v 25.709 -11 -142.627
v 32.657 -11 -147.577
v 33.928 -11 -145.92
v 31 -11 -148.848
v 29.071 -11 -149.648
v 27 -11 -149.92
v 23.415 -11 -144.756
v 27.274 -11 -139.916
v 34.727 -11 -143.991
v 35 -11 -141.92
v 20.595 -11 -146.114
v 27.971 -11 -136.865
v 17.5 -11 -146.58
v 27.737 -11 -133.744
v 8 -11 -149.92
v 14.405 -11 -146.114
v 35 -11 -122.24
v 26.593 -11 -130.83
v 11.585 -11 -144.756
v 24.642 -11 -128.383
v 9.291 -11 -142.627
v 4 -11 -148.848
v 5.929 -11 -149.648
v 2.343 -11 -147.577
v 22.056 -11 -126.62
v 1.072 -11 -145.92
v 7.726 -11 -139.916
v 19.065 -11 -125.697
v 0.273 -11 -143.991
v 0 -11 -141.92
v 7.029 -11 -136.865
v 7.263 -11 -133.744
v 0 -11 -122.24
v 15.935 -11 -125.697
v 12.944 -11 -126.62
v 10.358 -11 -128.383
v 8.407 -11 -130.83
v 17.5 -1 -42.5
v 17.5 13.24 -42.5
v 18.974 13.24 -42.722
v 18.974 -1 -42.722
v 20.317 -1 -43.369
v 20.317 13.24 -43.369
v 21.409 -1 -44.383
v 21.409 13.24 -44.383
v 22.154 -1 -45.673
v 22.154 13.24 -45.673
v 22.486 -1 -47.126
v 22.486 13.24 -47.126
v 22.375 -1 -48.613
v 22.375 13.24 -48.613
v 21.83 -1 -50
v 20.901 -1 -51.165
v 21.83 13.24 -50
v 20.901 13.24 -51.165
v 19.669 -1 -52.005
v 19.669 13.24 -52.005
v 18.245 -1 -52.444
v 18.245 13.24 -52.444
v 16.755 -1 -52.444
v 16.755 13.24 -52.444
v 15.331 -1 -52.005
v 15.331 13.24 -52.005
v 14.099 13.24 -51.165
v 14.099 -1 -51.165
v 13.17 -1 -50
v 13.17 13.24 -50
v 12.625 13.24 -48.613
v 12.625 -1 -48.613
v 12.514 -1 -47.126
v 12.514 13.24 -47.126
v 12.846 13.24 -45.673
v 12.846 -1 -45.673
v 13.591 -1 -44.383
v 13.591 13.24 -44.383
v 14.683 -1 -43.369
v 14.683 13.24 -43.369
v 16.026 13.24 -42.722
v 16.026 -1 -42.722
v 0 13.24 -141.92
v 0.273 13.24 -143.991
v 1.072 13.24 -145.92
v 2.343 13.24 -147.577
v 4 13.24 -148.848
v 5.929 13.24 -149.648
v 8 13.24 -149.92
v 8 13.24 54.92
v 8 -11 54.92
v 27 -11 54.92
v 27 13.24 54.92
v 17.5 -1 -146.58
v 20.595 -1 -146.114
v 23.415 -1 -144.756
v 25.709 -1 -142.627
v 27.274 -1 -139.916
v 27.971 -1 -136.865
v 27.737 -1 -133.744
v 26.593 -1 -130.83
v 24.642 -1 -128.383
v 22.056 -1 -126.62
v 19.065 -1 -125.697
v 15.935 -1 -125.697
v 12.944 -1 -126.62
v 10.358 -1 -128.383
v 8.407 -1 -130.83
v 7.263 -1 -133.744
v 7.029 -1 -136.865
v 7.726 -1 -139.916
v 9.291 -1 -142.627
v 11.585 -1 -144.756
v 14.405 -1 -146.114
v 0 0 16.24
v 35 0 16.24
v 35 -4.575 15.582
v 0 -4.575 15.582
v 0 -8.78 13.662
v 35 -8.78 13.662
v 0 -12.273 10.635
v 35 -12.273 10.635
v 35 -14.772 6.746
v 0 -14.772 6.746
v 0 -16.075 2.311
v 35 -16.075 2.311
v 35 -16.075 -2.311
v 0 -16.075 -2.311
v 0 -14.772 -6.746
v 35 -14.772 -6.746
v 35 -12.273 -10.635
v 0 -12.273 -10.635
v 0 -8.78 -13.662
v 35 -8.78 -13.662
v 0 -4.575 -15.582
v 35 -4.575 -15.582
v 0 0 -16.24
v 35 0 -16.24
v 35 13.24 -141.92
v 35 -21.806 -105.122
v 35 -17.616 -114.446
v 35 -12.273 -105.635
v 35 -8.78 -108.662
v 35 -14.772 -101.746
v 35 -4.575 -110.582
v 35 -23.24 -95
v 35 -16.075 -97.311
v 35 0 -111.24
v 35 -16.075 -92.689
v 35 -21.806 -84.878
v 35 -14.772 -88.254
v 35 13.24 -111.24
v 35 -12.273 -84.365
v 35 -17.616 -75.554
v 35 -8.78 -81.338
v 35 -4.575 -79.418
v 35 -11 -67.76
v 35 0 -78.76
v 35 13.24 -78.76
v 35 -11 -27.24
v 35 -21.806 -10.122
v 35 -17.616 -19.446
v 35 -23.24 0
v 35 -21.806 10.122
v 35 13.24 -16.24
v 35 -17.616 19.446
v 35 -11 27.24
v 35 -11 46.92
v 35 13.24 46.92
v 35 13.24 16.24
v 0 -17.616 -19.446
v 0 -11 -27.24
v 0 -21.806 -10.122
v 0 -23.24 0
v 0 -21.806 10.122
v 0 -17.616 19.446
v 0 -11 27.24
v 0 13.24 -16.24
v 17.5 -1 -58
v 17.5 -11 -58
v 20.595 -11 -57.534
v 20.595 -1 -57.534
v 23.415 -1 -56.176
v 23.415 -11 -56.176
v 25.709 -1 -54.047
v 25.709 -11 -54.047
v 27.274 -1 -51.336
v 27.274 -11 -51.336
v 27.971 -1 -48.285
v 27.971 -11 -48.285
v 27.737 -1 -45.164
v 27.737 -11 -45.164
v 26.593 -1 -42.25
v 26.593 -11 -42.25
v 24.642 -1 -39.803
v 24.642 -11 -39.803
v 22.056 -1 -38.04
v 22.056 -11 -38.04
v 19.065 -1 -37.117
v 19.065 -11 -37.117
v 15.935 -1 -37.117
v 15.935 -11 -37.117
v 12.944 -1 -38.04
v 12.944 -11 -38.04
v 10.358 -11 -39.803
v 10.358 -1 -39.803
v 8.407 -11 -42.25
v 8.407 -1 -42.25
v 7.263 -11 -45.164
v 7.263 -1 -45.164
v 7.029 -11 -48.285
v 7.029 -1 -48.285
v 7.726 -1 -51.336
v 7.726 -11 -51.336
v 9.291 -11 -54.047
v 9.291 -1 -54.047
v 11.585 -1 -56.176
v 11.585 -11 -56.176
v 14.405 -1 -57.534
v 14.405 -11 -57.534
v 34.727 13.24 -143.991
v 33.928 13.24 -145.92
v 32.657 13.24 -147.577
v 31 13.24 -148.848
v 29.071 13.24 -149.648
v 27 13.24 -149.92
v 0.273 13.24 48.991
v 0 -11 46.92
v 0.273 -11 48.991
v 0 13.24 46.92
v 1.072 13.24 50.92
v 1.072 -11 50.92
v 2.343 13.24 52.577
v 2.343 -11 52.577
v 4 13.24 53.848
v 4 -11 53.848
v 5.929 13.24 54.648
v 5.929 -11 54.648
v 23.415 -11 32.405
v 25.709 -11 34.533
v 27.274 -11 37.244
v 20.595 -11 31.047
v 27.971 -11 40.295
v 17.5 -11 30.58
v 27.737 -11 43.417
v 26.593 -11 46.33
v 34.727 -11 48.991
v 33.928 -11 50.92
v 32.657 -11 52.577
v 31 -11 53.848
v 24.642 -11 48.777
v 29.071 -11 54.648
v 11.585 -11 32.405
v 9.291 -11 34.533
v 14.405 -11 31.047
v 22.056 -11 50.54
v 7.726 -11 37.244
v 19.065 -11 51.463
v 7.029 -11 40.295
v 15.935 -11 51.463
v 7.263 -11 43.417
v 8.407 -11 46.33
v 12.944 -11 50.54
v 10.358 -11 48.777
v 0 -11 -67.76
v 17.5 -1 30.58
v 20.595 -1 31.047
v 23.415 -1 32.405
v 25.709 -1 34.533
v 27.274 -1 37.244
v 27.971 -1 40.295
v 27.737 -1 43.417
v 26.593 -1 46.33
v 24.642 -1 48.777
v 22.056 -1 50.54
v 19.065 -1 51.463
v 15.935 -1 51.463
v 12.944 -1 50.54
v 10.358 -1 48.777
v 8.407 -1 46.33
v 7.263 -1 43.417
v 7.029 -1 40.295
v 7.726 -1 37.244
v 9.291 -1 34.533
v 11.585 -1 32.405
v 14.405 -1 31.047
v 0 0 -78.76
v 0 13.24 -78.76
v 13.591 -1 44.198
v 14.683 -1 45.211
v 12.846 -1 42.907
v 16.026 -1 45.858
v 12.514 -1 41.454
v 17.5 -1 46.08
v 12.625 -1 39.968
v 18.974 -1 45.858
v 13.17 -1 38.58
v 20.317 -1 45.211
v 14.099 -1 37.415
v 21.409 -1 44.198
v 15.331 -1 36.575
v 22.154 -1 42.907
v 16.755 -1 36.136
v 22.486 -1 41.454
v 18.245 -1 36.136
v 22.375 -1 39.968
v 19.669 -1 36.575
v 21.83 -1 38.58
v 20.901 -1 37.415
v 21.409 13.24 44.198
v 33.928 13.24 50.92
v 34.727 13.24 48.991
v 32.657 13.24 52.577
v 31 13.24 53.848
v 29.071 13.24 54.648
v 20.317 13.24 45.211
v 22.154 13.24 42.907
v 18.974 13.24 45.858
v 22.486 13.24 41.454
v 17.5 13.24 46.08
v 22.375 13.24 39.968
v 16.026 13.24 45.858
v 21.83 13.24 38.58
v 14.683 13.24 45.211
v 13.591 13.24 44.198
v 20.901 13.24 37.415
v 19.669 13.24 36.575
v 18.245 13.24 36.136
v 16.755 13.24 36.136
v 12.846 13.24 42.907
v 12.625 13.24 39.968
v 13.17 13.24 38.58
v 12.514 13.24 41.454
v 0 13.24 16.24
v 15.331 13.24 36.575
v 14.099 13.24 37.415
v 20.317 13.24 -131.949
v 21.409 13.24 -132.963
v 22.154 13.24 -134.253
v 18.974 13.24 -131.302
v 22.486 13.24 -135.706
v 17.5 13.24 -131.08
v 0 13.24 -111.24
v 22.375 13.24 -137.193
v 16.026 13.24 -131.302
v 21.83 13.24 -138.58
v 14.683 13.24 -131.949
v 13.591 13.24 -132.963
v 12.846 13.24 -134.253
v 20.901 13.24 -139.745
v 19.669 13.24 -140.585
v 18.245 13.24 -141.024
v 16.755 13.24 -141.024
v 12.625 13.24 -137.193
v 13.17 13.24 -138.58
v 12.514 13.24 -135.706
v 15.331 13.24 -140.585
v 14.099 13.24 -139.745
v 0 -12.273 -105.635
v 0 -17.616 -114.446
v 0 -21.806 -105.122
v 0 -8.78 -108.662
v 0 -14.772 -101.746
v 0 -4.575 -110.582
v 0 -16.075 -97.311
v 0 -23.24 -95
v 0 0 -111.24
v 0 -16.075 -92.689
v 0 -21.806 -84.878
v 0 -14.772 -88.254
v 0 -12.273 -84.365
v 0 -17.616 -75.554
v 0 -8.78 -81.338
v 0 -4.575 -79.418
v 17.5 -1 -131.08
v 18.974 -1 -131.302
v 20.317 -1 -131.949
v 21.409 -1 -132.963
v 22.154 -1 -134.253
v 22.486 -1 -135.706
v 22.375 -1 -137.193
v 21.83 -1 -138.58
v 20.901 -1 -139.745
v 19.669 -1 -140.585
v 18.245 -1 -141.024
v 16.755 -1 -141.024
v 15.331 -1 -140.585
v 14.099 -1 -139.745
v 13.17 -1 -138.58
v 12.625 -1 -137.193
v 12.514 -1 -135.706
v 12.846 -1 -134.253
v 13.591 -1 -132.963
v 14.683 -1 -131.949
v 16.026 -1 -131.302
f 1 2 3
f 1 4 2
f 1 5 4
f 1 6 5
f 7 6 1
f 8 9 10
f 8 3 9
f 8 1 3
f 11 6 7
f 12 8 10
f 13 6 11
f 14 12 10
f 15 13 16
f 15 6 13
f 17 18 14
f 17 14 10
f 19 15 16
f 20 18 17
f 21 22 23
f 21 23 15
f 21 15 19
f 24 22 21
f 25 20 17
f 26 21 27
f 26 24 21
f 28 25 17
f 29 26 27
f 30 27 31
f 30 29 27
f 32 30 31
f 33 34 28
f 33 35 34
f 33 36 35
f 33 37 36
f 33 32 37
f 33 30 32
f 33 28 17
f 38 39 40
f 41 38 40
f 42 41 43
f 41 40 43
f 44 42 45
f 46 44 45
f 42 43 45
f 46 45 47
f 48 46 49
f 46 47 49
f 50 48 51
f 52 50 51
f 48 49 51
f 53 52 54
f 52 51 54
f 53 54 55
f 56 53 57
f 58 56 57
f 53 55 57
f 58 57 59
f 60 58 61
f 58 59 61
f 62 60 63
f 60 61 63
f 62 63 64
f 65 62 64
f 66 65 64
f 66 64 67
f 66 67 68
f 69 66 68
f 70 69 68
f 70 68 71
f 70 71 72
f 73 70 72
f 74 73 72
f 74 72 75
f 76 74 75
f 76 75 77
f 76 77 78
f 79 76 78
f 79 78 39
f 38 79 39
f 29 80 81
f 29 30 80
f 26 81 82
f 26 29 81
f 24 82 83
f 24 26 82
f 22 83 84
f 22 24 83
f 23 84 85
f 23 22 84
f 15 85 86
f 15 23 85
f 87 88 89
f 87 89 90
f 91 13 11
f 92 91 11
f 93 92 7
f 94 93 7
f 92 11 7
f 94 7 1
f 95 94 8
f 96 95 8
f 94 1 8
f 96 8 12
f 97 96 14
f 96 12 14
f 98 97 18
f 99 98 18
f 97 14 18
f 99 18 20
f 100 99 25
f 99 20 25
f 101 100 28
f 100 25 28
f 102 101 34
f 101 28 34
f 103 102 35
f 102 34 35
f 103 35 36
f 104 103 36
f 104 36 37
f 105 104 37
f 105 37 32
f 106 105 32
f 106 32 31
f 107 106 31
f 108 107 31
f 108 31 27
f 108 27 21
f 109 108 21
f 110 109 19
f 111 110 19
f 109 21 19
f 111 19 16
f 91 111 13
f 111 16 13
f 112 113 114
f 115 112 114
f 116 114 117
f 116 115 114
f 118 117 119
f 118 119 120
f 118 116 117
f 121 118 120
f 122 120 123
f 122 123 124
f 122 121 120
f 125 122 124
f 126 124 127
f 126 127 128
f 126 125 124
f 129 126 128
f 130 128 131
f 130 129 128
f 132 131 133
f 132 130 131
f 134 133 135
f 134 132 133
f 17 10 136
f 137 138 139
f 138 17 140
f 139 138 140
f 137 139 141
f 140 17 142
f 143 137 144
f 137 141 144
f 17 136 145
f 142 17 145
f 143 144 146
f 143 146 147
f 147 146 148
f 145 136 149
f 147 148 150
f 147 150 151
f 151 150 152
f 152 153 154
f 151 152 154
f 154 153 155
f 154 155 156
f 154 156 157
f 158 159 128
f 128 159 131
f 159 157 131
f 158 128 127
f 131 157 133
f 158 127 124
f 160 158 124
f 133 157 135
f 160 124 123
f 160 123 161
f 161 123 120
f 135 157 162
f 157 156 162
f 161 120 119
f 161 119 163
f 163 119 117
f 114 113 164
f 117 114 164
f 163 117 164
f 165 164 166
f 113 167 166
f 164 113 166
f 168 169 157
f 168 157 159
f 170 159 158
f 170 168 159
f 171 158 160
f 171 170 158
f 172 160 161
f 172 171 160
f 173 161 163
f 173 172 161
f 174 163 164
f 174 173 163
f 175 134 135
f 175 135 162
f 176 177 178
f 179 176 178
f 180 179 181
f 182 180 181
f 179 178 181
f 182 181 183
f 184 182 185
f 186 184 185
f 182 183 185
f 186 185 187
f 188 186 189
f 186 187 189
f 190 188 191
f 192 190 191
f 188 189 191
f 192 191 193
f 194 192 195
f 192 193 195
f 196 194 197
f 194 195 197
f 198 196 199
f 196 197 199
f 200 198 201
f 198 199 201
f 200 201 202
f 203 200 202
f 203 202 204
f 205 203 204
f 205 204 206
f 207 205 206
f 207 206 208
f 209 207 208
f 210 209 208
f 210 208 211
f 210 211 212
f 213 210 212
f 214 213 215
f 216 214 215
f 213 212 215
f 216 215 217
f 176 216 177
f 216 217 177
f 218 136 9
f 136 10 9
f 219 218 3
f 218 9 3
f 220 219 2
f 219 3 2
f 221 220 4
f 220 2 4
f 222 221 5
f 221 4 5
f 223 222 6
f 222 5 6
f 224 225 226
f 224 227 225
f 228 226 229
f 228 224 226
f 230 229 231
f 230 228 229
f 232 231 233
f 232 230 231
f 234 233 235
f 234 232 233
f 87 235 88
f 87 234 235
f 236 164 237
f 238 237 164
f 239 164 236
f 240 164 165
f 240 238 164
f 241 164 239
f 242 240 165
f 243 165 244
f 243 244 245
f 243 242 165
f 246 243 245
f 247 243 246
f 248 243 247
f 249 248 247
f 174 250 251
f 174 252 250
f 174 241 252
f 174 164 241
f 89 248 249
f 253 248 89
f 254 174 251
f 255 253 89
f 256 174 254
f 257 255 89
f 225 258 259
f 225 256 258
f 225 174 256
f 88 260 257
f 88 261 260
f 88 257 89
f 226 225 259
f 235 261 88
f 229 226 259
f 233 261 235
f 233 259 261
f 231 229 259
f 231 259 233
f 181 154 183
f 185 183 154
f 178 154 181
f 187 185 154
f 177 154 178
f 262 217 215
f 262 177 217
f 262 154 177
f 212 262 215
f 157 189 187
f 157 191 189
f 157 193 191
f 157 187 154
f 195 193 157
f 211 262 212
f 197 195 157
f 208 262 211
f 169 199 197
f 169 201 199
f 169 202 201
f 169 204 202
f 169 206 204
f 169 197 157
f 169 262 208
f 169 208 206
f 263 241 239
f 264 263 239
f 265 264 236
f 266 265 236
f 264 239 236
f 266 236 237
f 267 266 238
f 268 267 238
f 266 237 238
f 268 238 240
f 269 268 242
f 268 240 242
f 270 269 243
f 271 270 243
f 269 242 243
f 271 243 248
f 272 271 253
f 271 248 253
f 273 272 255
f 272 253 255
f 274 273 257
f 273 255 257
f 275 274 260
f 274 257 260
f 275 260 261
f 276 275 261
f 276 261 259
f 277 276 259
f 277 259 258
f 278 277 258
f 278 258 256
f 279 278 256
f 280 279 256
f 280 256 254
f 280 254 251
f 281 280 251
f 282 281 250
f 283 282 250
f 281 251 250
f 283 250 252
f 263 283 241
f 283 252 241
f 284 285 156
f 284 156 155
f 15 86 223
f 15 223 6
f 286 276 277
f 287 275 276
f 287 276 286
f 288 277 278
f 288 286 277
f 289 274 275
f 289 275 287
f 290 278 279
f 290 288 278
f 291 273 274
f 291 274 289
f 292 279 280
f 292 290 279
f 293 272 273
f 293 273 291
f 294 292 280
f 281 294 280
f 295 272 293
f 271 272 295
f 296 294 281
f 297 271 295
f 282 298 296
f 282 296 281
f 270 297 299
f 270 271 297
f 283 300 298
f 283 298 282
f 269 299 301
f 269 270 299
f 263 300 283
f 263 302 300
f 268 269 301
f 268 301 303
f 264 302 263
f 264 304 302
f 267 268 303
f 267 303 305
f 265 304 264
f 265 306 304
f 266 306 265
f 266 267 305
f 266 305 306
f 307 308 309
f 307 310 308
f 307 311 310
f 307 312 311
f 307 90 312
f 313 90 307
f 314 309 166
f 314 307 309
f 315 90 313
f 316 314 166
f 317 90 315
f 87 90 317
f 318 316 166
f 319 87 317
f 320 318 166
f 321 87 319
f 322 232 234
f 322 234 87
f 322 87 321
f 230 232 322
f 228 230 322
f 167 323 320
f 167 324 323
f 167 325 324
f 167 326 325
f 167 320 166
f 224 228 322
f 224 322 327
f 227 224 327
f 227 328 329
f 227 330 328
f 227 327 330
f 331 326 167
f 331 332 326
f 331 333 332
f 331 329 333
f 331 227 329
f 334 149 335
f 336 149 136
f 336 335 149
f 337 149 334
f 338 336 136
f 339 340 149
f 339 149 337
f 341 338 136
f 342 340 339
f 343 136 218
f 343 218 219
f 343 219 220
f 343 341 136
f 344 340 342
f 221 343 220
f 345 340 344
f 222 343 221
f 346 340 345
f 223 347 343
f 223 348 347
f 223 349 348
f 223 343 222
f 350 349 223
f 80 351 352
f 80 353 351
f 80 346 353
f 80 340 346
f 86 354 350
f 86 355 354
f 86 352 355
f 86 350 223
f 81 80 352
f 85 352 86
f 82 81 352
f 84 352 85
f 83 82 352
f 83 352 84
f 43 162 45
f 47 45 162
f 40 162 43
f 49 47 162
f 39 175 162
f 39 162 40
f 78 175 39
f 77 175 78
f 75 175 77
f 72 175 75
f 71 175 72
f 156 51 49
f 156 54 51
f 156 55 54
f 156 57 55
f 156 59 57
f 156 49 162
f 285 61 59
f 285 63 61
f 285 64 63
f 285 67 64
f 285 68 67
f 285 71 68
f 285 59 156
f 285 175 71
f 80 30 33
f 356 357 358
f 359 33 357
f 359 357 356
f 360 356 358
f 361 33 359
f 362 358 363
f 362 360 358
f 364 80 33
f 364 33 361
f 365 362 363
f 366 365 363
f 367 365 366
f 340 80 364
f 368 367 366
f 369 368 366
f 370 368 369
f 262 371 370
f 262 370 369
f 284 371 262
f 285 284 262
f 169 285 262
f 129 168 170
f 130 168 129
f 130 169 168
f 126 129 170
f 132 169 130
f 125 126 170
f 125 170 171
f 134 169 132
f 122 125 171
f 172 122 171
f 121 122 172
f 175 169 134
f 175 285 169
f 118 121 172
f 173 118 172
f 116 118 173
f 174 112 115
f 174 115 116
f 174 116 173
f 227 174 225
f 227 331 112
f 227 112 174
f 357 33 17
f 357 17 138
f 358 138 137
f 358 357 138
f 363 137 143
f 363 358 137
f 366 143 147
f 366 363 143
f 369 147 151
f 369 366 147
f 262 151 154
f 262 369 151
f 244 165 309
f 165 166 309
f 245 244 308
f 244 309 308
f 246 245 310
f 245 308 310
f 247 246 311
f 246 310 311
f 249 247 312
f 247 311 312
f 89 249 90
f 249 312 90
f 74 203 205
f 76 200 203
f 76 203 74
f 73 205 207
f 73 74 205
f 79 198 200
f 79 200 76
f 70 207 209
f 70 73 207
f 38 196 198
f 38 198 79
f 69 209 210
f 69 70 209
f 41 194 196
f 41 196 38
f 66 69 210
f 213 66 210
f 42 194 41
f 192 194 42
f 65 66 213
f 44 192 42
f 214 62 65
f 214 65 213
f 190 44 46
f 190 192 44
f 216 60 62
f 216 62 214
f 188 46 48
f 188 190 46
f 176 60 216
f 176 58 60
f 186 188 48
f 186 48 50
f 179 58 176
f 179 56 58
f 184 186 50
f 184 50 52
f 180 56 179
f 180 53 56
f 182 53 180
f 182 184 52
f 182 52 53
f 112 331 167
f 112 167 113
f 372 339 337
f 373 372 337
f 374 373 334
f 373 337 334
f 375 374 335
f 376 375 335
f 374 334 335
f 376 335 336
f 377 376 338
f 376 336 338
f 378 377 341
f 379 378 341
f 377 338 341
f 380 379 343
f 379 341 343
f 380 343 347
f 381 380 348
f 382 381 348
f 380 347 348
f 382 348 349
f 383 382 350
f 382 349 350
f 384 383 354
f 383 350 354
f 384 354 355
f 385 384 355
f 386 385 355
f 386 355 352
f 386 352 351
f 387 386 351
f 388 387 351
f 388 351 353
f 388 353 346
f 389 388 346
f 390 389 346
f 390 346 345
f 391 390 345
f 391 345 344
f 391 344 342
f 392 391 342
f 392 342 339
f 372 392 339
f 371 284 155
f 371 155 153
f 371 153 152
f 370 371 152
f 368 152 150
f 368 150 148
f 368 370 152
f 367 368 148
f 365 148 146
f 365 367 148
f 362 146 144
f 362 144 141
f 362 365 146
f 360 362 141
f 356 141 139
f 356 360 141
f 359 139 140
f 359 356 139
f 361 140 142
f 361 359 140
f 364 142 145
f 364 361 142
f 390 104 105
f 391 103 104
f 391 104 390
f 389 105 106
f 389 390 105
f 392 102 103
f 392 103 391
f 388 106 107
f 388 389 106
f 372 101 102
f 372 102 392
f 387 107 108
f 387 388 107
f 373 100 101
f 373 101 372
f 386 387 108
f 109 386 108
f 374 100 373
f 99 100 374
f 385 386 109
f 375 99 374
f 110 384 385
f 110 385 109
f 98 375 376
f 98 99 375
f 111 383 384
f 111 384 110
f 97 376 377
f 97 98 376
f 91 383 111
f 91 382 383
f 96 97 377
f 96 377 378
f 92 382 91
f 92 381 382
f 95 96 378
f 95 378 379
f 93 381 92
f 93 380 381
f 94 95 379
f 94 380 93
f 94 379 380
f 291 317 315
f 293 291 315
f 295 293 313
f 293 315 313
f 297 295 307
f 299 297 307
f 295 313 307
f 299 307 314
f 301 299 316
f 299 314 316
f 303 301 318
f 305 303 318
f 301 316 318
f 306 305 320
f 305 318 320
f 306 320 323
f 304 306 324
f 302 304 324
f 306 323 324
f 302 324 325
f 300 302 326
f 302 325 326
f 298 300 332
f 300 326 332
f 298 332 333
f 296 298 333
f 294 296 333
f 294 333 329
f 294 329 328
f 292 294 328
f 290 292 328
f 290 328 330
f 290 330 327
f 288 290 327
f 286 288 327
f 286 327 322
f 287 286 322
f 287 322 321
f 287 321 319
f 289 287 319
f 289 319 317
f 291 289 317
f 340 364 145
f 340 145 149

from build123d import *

# Parameters (mm, degrees)
BOSS_EXTRUDE1_DEPTH = 35
CUT_EXTRUDE1_REACH  = 160.215
SKETCH3_R           = 5
SKETCH4_R           = 10.5
CUT_EXTRUDE2_DEPTH  = 10
FILLET1_R           = 8


with BuildPart() as part:
    # Sketch2 → Boss-Extrude1 (new body)
    with BuildSketch(Plane(origin=(0, 0, 0), x_dir=(0, 0, -1), z_dir=(1, 0, 0))):
        with BuildLine():
            Line((-27.24, -11), (-54.920224718, -11))
            Line((-54.920224718, -11), (-54.920224718, 0))
            Line((-54.920224718, 0), (-54.920224718, 13.24))
            Line((-54.920224718, 13.24), (-16.24, 13.24))
            Line((-16.24, 13.24), (-16.24, 0))
            ThreePointArc((-16.24, 0), (0, -16.24), (16.24, 0))
            Line((16.24, 0), (16.24, 13.24))
            Line((16.24, 13.24), (78.76, 13.24))
            Line((78.76, 13.24), (78.76, 0))
            ThreePointArc((78.76, 0), (95, -16.24), (111.24, 0))
            Line((111.24, 0), (111.24, 13.24))
            Line((111.24, 13.24), (149.920224718, 13.24))
            Line((149.920224718, 13.24), (149.920224718, 0))
            Line((149.920224718, 0), (149.920224718, -11))
            Line((149.920224718, -11), (122.24, -11))
            ThreePointArc((122.24, -11), (95, -23.24), (67.76, -11))
            Line((67.76, -11), (27.24, -11))
            ThreePointArc((27.24, -11), (0, -23.24), (-27.24, -11))
        make_face()
    extrude(amount=BOSS_EXTRUDE1_DEPTH)

    # Sketch3 → Cut-Extrude1 (cut, up to next)
    with BuildSketch(Plane(origin=(0, 13.24, 0), x_dir=(1, 0, 0), z_dir=(0, 1, 0)), mode=Mode.PRIVATE) as cut_extrude1_sk1:
        with Locations(Location((17.5, -41.080112359, 0), (0, 0, 270))):
            Circle(SKETCH3_R)
    cut_extrude1_tool1 = extrude(cut_extrude1_sk1.sketch, amount=-CUT_EXTRUDE1_REACH, mode=Mode.PRIVATE) & part.part
    # Sketch3 → Cut-Extrude1 (cut, up to next)
    with BuildSketch(Plane(origin=(0, 13.24, 0), x_dir=(1, 0, 0), z_dir=(0, 1, 0)), mode=Mode.PRIVATE) as cut_extrude1_sk2:
        with Locations(Location((17.5, 136.080112359, 0), (0, 0, 270))):
            Circle(SKETCH3_R)
    cut_extrude1_tool2 = extrude(cut_extrude1_sk2.sketch, amount=-CUT_EXTRUDE1_REACH, mode=Mode.PRIVATE) & part.part
    # Sketch3 → Cut-Extrude1 (cut, up to next)
    with BuildSketch(Plane(origin=(0, 13.24, 0), x_dir=(1, 0, 0), z_dir=(0, 1, 0)), mode=Mode.PRIVATE) as cut_extrude1_sk3:
        with Locations(Location((17.5, 47.5, 0), (0, 0, 270))):
            Circle(SKETCH3_R)
    cut_extrude1_tool3 = extrude(cut_extrude1_sk3.sketch, amount=-CUT_EXTRUDE1_REACH, mode=Mode.PRIVATE) & part.part
    add(cut_extrude1_tool1.solids().sort_by_distance((17.5, 13.24, 41.080112))[0], mode=Mode.SUBTRACT)
    add(cut_extrude1_tool2.solids().sort_by_distance((17.5, 13.24, -136.080112))[0], mode=Mode.SUBTRACT)
    add(cut_extrude1_tool3.solids().sort_by_distance((17.5, 13.24, -47.5))[0], mode=Mode.SUBTRACT)

    # Sketch4 → Cut-Extrude2 (cut)
    with BuildSketch(Plane.XZ.offset(11)):
        with Locations(Location((17.5, -47.5, 0), (0, 0, 270))):
            Circle(SKETCH4_R)
        with Locations(Location((17.5, -136.080112359, 0), (0, 0, 270))):
            Circle(SKETCH4_R)
        with Locations(Location((17.5, 41.080112359, 0), (0, 0, 270))):
            Circle(SKETCH4_R)
    extrude(amount=-CUT_EXTRUDE2_DEPTH, mode=Mode.SUBTRACT)

    # Fillet1
    fillet1_edges = [part.edges().sort_by_distance(p)[0] for p in [
        (35, 1.12, 54.920224718),
        (0, 1.12, -149.920224718),
        (0, 1.12, 54.920224718),
        (35, 1.12, -149.920224718),
    ]]
    fillet(fillet1_edges, radius=FILLET1_R)


solid = part.part
